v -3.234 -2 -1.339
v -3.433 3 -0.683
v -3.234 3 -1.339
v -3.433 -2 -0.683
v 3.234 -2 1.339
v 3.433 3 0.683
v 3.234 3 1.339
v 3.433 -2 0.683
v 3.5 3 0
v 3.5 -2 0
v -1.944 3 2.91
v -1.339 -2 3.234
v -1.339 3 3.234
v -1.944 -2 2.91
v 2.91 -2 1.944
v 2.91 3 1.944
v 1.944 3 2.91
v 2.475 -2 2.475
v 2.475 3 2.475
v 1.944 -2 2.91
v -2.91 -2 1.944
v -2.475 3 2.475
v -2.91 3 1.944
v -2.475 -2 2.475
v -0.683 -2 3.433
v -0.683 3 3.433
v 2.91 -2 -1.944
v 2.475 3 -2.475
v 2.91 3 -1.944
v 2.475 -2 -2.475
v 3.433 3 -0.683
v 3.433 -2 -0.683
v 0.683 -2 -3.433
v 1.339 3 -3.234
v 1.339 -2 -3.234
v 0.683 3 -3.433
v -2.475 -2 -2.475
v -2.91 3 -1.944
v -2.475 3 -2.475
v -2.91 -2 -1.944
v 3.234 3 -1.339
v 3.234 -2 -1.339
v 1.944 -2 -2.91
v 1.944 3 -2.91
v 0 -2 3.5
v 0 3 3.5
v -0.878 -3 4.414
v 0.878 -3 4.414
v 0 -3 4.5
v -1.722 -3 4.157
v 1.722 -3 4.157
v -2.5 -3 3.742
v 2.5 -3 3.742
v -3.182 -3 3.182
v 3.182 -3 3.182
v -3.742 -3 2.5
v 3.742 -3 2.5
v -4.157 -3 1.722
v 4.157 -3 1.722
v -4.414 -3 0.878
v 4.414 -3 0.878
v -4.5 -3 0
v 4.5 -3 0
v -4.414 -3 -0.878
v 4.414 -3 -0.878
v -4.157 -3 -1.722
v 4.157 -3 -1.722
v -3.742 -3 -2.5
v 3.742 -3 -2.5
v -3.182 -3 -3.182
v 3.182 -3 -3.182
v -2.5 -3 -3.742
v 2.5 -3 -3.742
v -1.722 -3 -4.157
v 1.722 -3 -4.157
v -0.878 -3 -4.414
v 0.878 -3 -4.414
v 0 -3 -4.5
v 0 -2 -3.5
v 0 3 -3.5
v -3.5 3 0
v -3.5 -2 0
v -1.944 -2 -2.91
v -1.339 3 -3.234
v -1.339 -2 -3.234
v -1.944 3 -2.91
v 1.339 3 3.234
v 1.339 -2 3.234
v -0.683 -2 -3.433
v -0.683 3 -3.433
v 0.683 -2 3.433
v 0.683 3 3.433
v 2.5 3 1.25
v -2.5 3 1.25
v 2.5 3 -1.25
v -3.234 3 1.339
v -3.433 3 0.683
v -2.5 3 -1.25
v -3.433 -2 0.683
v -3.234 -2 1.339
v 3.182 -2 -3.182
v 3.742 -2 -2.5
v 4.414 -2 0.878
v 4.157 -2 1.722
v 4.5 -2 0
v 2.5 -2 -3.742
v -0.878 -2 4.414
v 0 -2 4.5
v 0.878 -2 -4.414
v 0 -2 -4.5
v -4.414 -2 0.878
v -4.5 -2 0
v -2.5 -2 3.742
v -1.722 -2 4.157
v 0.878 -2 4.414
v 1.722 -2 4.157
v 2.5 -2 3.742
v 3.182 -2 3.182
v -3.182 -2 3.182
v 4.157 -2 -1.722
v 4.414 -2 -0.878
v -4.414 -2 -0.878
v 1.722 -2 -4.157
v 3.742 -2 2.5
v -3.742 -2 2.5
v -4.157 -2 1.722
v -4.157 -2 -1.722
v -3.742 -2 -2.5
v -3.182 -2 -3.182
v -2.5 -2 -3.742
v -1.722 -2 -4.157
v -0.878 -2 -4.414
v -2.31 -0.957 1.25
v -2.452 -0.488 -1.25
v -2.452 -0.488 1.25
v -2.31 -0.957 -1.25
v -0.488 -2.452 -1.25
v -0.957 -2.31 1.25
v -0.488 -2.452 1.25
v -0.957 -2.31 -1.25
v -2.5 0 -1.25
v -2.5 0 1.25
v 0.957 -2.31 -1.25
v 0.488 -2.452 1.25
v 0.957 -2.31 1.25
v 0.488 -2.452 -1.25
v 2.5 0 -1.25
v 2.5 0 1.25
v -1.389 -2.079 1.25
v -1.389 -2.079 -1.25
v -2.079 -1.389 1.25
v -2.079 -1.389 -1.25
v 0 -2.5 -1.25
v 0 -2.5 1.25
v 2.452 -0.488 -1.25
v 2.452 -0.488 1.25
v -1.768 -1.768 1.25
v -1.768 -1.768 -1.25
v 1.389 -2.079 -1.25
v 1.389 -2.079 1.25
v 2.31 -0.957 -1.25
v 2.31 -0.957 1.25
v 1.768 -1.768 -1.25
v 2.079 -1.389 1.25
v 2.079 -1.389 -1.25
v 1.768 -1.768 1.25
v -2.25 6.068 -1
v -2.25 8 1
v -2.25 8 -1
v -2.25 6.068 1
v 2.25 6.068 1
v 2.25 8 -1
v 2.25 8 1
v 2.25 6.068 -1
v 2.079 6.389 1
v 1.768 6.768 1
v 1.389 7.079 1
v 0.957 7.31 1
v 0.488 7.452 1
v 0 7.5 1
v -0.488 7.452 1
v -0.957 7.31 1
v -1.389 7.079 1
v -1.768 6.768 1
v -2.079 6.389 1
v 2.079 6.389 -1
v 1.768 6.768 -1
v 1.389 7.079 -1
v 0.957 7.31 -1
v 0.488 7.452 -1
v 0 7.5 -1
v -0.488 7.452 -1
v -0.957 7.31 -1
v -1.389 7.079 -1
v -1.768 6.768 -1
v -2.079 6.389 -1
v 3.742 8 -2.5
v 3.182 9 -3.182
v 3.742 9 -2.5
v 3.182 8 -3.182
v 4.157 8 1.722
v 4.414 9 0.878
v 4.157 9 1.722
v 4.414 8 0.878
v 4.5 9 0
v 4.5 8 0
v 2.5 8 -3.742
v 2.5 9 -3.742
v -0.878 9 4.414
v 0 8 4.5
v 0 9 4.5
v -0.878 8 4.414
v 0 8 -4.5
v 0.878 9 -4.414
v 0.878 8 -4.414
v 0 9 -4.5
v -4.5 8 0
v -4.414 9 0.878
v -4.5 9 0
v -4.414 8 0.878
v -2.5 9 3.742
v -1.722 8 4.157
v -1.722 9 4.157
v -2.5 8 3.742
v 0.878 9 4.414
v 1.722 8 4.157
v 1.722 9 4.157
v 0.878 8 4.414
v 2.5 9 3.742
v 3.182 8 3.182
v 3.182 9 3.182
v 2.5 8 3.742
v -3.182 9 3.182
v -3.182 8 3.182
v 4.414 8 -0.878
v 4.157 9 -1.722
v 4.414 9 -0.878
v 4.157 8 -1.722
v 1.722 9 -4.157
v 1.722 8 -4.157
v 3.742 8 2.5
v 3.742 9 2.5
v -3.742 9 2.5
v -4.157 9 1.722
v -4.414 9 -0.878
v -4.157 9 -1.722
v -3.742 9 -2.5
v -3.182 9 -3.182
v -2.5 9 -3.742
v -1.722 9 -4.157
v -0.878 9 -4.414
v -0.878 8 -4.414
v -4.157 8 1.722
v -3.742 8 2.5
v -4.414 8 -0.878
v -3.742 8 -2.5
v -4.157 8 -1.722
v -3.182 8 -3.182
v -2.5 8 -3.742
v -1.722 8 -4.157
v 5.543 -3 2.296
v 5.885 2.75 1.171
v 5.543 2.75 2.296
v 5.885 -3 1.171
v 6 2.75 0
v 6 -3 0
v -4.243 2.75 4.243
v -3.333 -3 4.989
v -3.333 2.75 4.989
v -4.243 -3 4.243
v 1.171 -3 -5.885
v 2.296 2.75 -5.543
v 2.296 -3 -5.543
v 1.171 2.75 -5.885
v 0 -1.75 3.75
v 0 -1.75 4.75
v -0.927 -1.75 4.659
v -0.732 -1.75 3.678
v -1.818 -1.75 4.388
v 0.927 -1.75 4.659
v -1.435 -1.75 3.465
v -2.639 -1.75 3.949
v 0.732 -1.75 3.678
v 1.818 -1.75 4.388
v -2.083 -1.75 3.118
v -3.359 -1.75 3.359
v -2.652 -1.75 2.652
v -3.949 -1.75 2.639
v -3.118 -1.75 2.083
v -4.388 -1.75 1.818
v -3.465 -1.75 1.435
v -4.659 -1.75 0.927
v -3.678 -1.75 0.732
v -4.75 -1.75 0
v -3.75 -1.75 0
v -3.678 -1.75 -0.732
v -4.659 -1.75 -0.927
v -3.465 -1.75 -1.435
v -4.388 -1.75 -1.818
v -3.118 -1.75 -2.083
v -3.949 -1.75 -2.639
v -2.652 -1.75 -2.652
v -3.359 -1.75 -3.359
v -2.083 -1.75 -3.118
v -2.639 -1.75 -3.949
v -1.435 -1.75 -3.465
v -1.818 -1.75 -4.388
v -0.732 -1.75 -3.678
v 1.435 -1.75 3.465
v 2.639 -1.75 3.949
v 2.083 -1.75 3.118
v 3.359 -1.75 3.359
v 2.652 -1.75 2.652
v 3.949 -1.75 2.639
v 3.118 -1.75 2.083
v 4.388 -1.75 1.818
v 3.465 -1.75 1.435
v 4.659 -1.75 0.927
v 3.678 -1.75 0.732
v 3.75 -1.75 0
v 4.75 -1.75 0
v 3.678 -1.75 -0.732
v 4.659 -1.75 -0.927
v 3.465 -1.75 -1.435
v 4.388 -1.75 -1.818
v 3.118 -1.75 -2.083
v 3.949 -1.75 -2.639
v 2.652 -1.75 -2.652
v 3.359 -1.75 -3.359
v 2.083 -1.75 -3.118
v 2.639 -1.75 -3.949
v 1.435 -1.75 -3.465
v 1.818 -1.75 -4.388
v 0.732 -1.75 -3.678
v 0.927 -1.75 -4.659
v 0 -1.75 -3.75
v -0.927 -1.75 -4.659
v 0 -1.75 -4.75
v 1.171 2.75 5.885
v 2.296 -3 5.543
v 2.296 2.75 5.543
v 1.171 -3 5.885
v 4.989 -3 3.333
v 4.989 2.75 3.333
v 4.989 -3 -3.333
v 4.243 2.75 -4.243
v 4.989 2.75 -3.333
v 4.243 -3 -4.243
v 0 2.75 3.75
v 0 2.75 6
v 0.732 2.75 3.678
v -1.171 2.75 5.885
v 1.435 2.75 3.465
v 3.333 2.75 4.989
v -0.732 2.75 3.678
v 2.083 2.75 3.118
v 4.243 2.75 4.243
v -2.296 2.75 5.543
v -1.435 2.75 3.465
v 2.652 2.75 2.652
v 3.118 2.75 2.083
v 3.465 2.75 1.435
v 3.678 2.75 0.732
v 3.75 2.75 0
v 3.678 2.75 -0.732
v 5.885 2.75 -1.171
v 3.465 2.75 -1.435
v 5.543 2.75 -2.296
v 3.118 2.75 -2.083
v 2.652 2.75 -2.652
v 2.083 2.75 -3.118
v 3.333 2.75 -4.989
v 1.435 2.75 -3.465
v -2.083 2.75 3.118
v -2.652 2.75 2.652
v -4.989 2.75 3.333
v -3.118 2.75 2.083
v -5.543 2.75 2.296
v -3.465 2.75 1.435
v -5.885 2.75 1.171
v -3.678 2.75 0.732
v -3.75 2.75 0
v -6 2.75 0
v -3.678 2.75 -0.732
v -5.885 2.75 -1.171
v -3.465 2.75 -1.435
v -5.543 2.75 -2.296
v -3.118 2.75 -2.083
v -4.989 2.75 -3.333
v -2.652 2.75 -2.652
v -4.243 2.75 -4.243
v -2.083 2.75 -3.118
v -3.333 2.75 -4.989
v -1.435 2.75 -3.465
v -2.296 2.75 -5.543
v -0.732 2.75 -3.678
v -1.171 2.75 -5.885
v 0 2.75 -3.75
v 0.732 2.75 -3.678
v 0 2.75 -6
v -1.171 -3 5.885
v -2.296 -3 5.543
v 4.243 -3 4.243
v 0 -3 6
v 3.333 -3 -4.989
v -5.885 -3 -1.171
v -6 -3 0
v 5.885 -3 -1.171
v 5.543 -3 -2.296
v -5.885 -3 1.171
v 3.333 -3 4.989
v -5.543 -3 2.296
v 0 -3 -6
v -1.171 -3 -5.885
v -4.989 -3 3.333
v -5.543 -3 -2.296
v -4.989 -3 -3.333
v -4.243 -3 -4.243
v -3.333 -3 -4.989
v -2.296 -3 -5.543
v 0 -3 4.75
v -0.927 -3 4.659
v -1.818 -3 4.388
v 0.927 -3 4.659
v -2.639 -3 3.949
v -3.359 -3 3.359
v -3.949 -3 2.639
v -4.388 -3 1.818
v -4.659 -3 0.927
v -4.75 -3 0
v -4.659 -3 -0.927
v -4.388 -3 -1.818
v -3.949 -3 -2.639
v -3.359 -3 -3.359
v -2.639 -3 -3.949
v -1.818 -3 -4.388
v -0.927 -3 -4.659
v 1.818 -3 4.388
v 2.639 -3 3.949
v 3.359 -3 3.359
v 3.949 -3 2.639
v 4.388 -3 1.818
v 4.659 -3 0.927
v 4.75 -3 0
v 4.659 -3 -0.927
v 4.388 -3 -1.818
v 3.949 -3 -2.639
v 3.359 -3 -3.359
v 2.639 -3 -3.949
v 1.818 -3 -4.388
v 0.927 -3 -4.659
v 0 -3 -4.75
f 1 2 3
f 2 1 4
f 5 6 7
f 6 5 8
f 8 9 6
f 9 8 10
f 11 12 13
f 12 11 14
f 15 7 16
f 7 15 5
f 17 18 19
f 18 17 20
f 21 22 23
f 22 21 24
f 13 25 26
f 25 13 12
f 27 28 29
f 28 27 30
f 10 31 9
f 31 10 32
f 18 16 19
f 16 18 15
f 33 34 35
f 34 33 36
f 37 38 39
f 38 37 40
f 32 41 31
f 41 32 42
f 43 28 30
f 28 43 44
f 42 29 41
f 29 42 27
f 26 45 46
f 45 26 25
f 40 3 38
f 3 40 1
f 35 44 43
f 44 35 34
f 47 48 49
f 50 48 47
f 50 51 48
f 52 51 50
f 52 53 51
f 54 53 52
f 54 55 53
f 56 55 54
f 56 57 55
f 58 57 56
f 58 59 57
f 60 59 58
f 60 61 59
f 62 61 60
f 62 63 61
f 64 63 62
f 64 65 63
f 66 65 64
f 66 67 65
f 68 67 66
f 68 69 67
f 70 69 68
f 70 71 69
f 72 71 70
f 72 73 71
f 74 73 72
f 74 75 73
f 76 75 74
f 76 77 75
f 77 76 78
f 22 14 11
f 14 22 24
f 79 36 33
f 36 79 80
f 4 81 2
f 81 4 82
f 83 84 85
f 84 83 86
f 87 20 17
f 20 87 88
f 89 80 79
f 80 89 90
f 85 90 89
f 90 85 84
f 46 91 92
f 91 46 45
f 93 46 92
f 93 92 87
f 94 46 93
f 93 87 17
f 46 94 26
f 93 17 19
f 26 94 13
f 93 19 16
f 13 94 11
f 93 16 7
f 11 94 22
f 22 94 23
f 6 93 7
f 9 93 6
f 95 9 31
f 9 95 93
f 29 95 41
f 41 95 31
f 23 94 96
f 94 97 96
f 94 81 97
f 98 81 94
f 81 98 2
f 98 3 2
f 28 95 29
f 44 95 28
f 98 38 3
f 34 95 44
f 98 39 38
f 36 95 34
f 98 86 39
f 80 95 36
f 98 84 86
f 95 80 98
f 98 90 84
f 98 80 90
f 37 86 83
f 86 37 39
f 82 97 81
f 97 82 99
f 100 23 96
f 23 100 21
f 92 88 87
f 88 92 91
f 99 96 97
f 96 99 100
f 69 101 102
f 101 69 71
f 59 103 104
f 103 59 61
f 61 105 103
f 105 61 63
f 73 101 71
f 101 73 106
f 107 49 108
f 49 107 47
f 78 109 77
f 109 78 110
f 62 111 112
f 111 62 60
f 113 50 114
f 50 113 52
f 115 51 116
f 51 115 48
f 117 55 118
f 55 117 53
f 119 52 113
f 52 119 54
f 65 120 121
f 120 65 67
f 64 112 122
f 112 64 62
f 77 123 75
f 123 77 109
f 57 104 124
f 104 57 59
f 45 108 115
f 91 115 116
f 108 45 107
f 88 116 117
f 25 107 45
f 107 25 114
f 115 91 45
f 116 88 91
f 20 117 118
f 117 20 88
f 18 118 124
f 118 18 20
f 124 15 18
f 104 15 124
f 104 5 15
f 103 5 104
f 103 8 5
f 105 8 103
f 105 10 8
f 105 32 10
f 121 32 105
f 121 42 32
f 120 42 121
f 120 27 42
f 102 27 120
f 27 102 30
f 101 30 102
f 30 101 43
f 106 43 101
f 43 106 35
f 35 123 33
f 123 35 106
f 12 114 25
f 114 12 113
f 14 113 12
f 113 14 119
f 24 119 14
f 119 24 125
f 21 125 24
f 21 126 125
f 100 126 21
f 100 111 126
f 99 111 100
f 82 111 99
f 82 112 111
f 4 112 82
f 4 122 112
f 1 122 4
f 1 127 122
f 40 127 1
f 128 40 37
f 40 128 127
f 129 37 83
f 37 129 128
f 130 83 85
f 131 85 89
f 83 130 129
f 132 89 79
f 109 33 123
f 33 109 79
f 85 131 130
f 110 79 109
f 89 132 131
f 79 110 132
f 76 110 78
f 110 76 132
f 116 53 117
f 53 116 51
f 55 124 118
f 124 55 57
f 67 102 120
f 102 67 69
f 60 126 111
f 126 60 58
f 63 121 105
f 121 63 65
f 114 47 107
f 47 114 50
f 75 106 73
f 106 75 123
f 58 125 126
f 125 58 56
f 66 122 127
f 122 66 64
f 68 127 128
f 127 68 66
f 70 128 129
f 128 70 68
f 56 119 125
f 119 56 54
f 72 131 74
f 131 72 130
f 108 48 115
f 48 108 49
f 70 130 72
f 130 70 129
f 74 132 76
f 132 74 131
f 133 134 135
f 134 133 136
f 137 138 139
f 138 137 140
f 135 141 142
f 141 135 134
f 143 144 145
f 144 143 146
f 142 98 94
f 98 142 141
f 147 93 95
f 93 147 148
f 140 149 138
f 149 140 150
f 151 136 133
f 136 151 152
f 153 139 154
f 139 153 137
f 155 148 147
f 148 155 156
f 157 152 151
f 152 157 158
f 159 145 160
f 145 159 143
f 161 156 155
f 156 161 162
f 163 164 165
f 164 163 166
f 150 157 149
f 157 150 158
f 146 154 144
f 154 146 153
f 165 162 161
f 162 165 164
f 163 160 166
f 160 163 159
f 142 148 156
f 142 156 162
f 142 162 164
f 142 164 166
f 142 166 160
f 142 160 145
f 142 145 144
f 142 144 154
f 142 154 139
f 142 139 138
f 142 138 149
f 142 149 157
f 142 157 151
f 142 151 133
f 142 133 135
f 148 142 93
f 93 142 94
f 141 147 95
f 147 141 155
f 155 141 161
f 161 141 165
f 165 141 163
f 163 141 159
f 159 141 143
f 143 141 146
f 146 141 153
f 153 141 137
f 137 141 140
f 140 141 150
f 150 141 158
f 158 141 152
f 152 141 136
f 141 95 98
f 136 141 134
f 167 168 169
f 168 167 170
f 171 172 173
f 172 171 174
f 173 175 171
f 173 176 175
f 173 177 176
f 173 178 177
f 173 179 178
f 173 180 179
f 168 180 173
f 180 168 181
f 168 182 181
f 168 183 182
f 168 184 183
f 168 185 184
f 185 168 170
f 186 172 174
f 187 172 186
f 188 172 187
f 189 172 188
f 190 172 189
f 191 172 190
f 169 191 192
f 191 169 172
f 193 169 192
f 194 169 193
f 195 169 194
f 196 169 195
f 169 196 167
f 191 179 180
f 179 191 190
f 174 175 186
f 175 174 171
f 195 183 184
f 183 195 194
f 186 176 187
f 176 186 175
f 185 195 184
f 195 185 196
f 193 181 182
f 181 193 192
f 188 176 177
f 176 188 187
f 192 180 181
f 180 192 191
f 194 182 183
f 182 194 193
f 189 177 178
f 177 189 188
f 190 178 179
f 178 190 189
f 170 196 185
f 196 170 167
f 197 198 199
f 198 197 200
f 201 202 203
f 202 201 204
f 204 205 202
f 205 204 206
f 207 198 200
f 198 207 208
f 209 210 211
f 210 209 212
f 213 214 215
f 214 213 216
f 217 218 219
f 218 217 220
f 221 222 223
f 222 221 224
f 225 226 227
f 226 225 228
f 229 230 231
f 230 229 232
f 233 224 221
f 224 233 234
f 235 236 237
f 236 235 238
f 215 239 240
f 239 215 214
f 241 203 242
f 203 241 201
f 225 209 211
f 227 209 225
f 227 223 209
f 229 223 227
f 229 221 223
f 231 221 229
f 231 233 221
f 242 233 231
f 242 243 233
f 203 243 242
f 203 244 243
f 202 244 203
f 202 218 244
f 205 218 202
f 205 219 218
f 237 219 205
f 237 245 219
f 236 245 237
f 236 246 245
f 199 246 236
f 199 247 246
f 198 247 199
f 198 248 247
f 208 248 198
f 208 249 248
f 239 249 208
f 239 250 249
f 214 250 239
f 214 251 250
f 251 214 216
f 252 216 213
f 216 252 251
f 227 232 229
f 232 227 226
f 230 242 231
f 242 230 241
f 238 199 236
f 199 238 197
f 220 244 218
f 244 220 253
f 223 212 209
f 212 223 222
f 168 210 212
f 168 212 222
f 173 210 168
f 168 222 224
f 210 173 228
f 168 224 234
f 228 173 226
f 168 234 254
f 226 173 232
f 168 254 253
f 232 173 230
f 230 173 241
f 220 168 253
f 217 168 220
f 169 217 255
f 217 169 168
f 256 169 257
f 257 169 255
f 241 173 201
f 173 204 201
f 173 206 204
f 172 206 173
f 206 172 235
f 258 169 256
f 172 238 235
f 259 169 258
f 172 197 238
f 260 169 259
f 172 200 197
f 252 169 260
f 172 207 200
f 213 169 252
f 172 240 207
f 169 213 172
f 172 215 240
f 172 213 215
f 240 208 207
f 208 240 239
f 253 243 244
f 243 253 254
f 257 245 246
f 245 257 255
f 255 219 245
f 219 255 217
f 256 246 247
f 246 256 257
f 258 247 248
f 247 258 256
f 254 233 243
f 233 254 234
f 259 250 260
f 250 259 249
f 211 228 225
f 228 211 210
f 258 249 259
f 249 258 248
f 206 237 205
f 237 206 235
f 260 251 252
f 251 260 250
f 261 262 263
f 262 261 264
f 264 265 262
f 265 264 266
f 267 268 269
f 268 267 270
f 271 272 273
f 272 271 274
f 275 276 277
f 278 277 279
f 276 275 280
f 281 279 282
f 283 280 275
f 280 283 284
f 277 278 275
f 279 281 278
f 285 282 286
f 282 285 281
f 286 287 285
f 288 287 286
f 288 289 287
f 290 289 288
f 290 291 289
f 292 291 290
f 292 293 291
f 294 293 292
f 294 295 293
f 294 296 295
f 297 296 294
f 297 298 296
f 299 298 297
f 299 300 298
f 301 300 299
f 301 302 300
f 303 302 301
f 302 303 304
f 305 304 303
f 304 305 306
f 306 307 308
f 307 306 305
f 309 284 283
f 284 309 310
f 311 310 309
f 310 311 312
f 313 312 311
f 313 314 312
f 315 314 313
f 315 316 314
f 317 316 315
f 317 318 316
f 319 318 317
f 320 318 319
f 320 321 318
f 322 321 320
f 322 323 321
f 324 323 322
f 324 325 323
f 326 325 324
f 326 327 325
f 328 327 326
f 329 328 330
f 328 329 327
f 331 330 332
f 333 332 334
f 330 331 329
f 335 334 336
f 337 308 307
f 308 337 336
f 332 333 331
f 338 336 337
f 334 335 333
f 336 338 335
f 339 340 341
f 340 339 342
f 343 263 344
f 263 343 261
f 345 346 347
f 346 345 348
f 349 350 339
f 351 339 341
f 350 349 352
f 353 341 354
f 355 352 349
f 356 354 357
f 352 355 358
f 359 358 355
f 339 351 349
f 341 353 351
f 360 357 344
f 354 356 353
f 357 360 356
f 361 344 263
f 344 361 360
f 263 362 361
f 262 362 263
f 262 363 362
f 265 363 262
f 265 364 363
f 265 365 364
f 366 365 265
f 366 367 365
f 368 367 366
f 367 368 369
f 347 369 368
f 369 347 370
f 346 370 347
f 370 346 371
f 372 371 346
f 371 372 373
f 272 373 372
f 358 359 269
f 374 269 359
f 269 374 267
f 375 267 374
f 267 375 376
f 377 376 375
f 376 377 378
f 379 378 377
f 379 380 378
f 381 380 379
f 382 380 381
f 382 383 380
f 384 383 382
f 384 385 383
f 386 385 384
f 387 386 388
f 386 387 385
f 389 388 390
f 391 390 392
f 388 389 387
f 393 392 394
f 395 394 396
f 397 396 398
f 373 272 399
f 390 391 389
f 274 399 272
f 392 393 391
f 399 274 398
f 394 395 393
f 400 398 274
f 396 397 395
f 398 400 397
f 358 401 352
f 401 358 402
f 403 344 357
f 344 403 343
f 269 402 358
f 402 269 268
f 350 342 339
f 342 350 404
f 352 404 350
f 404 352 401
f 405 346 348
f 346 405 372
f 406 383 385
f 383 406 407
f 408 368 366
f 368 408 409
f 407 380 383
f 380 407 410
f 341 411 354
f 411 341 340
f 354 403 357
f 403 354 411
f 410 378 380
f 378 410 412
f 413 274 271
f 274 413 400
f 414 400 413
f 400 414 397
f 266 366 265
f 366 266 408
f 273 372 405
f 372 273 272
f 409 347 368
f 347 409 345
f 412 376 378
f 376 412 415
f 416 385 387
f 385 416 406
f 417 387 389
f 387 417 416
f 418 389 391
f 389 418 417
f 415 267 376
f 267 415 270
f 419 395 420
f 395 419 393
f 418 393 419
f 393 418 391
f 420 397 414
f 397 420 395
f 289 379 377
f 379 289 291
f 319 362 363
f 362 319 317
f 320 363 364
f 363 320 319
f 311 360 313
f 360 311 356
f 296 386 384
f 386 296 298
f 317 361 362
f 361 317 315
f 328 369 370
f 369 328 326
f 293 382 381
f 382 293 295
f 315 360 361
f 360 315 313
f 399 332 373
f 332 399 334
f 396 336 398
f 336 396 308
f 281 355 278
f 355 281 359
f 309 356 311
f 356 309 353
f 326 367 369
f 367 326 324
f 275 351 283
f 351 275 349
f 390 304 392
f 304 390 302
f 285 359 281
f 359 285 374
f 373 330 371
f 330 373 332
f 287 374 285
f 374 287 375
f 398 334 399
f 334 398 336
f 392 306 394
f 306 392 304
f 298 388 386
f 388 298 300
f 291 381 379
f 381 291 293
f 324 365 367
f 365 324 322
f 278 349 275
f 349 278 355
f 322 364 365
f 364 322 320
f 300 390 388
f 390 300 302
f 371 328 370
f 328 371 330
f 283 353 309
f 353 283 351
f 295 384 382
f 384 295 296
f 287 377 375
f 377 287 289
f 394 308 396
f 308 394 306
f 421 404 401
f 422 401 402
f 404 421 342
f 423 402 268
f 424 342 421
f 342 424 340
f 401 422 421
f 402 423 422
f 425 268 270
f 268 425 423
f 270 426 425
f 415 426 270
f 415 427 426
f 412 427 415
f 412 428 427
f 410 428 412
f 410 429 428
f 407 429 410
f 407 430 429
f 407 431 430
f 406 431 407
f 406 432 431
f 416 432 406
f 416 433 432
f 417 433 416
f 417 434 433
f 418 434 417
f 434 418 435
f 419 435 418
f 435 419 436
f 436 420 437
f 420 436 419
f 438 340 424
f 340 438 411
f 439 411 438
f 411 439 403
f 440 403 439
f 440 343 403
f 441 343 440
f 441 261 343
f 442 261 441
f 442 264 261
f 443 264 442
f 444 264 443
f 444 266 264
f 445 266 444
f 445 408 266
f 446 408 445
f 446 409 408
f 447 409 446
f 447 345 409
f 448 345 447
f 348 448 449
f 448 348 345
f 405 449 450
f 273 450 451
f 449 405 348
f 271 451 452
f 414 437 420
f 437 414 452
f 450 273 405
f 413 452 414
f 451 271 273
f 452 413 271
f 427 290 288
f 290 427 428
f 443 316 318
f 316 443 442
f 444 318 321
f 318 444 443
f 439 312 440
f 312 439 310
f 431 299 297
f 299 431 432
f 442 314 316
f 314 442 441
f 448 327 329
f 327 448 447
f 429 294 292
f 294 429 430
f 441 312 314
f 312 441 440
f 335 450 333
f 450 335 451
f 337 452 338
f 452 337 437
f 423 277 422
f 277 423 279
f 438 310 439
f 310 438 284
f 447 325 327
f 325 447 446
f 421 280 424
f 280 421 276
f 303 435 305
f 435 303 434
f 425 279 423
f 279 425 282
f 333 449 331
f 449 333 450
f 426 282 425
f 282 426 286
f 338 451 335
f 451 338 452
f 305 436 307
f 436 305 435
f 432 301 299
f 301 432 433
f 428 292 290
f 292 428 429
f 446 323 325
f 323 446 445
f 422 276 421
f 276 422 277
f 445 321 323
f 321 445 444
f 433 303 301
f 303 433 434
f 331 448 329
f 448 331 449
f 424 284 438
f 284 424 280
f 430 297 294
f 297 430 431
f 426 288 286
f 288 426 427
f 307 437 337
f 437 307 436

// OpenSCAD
difference() {
    union() {
        rotate([90,0,0])
            cylinder(d=7, h=6, center=true, $fn=32);
        translate([0,-2.5,0])
            rotate([90,0,0])
                cylinder(d=9, h=1, center=true, $fn=32);

    }
    hull() {
        translate([0,5,0])
            cylinder(d=5, h=2.5, center=true, $fn=32);
        translate([0,0,0])
            cylinder(d=5, h=2.5, center=true, $fn=32);
    }
}

translate([0,5,0]) {

    translate([0,3.5,0])
        rotate([90,0,0])
            cylinder(d=9, h=1, center=true, $fn=32);
    difference() {
    hull() {
        translate([0,3,0])
            cube([4.5,1,2], center=true);
//        translate([0,10,0])
//            cylinder(d=4.5, h=2, center=true, $fn=32);
        translate([0,0,0])
            cylinder(d=4.5, h=2, center=true, $fn=32);
    }
    translate([0,0,0])
        cylinder(d=5, h=2.5, center=true, $fn=32);
    
    }
}

difference() {
    translate([0,0.5,0])
        rotate([90,0,0])
            cylinder(d=12, h=4.5, center=true, $fn=32);
    translate([0,0.5,0])
        rotate([90,0,0])
            cylinder(d=7.5, h=4.6, center=true, $fn=32);
}

translate([0,-2.25,0])
    difference() {
        rotate([90,0,0])
            cylinder(d=12, h=1.5, center=true, $fn=32);
        rotate([90,0,0])
            cylinder(d=9.5, h=1.6, center=true, $fn=32);
}
